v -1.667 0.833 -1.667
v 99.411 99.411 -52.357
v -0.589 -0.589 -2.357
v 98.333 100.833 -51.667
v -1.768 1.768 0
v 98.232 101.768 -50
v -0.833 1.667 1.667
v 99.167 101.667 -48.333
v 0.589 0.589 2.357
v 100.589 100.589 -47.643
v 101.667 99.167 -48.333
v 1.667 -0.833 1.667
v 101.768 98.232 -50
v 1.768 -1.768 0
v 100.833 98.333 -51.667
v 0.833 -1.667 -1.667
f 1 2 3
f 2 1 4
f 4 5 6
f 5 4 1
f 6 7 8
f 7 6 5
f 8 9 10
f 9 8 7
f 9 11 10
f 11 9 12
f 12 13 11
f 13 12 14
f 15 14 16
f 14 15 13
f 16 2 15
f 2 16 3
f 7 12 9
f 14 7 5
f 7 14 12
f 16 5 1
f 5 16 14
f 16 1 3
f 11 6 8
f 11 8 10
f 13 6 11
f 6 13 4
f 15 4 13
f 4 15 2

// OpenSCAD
rotate(a = [0, 109.4712206345, 45.0000000000]) {
	translate(v = [0, 0, 0]) {
		cylinder(d = 5, h = 150.0000000000);
	}
}
/***********************************************
*********      SolidPython code:      **********
************************************************
 
global draft
draft = True

from lib.global_parameters import *
from lib.model_parameters import *

from solid import *
from solid.utils import *

import os



m = tube((100, 100 ,-50), 5, center = True)



scad_render_to_file(m, '../111_2001.scad') 
 
************************************************/
